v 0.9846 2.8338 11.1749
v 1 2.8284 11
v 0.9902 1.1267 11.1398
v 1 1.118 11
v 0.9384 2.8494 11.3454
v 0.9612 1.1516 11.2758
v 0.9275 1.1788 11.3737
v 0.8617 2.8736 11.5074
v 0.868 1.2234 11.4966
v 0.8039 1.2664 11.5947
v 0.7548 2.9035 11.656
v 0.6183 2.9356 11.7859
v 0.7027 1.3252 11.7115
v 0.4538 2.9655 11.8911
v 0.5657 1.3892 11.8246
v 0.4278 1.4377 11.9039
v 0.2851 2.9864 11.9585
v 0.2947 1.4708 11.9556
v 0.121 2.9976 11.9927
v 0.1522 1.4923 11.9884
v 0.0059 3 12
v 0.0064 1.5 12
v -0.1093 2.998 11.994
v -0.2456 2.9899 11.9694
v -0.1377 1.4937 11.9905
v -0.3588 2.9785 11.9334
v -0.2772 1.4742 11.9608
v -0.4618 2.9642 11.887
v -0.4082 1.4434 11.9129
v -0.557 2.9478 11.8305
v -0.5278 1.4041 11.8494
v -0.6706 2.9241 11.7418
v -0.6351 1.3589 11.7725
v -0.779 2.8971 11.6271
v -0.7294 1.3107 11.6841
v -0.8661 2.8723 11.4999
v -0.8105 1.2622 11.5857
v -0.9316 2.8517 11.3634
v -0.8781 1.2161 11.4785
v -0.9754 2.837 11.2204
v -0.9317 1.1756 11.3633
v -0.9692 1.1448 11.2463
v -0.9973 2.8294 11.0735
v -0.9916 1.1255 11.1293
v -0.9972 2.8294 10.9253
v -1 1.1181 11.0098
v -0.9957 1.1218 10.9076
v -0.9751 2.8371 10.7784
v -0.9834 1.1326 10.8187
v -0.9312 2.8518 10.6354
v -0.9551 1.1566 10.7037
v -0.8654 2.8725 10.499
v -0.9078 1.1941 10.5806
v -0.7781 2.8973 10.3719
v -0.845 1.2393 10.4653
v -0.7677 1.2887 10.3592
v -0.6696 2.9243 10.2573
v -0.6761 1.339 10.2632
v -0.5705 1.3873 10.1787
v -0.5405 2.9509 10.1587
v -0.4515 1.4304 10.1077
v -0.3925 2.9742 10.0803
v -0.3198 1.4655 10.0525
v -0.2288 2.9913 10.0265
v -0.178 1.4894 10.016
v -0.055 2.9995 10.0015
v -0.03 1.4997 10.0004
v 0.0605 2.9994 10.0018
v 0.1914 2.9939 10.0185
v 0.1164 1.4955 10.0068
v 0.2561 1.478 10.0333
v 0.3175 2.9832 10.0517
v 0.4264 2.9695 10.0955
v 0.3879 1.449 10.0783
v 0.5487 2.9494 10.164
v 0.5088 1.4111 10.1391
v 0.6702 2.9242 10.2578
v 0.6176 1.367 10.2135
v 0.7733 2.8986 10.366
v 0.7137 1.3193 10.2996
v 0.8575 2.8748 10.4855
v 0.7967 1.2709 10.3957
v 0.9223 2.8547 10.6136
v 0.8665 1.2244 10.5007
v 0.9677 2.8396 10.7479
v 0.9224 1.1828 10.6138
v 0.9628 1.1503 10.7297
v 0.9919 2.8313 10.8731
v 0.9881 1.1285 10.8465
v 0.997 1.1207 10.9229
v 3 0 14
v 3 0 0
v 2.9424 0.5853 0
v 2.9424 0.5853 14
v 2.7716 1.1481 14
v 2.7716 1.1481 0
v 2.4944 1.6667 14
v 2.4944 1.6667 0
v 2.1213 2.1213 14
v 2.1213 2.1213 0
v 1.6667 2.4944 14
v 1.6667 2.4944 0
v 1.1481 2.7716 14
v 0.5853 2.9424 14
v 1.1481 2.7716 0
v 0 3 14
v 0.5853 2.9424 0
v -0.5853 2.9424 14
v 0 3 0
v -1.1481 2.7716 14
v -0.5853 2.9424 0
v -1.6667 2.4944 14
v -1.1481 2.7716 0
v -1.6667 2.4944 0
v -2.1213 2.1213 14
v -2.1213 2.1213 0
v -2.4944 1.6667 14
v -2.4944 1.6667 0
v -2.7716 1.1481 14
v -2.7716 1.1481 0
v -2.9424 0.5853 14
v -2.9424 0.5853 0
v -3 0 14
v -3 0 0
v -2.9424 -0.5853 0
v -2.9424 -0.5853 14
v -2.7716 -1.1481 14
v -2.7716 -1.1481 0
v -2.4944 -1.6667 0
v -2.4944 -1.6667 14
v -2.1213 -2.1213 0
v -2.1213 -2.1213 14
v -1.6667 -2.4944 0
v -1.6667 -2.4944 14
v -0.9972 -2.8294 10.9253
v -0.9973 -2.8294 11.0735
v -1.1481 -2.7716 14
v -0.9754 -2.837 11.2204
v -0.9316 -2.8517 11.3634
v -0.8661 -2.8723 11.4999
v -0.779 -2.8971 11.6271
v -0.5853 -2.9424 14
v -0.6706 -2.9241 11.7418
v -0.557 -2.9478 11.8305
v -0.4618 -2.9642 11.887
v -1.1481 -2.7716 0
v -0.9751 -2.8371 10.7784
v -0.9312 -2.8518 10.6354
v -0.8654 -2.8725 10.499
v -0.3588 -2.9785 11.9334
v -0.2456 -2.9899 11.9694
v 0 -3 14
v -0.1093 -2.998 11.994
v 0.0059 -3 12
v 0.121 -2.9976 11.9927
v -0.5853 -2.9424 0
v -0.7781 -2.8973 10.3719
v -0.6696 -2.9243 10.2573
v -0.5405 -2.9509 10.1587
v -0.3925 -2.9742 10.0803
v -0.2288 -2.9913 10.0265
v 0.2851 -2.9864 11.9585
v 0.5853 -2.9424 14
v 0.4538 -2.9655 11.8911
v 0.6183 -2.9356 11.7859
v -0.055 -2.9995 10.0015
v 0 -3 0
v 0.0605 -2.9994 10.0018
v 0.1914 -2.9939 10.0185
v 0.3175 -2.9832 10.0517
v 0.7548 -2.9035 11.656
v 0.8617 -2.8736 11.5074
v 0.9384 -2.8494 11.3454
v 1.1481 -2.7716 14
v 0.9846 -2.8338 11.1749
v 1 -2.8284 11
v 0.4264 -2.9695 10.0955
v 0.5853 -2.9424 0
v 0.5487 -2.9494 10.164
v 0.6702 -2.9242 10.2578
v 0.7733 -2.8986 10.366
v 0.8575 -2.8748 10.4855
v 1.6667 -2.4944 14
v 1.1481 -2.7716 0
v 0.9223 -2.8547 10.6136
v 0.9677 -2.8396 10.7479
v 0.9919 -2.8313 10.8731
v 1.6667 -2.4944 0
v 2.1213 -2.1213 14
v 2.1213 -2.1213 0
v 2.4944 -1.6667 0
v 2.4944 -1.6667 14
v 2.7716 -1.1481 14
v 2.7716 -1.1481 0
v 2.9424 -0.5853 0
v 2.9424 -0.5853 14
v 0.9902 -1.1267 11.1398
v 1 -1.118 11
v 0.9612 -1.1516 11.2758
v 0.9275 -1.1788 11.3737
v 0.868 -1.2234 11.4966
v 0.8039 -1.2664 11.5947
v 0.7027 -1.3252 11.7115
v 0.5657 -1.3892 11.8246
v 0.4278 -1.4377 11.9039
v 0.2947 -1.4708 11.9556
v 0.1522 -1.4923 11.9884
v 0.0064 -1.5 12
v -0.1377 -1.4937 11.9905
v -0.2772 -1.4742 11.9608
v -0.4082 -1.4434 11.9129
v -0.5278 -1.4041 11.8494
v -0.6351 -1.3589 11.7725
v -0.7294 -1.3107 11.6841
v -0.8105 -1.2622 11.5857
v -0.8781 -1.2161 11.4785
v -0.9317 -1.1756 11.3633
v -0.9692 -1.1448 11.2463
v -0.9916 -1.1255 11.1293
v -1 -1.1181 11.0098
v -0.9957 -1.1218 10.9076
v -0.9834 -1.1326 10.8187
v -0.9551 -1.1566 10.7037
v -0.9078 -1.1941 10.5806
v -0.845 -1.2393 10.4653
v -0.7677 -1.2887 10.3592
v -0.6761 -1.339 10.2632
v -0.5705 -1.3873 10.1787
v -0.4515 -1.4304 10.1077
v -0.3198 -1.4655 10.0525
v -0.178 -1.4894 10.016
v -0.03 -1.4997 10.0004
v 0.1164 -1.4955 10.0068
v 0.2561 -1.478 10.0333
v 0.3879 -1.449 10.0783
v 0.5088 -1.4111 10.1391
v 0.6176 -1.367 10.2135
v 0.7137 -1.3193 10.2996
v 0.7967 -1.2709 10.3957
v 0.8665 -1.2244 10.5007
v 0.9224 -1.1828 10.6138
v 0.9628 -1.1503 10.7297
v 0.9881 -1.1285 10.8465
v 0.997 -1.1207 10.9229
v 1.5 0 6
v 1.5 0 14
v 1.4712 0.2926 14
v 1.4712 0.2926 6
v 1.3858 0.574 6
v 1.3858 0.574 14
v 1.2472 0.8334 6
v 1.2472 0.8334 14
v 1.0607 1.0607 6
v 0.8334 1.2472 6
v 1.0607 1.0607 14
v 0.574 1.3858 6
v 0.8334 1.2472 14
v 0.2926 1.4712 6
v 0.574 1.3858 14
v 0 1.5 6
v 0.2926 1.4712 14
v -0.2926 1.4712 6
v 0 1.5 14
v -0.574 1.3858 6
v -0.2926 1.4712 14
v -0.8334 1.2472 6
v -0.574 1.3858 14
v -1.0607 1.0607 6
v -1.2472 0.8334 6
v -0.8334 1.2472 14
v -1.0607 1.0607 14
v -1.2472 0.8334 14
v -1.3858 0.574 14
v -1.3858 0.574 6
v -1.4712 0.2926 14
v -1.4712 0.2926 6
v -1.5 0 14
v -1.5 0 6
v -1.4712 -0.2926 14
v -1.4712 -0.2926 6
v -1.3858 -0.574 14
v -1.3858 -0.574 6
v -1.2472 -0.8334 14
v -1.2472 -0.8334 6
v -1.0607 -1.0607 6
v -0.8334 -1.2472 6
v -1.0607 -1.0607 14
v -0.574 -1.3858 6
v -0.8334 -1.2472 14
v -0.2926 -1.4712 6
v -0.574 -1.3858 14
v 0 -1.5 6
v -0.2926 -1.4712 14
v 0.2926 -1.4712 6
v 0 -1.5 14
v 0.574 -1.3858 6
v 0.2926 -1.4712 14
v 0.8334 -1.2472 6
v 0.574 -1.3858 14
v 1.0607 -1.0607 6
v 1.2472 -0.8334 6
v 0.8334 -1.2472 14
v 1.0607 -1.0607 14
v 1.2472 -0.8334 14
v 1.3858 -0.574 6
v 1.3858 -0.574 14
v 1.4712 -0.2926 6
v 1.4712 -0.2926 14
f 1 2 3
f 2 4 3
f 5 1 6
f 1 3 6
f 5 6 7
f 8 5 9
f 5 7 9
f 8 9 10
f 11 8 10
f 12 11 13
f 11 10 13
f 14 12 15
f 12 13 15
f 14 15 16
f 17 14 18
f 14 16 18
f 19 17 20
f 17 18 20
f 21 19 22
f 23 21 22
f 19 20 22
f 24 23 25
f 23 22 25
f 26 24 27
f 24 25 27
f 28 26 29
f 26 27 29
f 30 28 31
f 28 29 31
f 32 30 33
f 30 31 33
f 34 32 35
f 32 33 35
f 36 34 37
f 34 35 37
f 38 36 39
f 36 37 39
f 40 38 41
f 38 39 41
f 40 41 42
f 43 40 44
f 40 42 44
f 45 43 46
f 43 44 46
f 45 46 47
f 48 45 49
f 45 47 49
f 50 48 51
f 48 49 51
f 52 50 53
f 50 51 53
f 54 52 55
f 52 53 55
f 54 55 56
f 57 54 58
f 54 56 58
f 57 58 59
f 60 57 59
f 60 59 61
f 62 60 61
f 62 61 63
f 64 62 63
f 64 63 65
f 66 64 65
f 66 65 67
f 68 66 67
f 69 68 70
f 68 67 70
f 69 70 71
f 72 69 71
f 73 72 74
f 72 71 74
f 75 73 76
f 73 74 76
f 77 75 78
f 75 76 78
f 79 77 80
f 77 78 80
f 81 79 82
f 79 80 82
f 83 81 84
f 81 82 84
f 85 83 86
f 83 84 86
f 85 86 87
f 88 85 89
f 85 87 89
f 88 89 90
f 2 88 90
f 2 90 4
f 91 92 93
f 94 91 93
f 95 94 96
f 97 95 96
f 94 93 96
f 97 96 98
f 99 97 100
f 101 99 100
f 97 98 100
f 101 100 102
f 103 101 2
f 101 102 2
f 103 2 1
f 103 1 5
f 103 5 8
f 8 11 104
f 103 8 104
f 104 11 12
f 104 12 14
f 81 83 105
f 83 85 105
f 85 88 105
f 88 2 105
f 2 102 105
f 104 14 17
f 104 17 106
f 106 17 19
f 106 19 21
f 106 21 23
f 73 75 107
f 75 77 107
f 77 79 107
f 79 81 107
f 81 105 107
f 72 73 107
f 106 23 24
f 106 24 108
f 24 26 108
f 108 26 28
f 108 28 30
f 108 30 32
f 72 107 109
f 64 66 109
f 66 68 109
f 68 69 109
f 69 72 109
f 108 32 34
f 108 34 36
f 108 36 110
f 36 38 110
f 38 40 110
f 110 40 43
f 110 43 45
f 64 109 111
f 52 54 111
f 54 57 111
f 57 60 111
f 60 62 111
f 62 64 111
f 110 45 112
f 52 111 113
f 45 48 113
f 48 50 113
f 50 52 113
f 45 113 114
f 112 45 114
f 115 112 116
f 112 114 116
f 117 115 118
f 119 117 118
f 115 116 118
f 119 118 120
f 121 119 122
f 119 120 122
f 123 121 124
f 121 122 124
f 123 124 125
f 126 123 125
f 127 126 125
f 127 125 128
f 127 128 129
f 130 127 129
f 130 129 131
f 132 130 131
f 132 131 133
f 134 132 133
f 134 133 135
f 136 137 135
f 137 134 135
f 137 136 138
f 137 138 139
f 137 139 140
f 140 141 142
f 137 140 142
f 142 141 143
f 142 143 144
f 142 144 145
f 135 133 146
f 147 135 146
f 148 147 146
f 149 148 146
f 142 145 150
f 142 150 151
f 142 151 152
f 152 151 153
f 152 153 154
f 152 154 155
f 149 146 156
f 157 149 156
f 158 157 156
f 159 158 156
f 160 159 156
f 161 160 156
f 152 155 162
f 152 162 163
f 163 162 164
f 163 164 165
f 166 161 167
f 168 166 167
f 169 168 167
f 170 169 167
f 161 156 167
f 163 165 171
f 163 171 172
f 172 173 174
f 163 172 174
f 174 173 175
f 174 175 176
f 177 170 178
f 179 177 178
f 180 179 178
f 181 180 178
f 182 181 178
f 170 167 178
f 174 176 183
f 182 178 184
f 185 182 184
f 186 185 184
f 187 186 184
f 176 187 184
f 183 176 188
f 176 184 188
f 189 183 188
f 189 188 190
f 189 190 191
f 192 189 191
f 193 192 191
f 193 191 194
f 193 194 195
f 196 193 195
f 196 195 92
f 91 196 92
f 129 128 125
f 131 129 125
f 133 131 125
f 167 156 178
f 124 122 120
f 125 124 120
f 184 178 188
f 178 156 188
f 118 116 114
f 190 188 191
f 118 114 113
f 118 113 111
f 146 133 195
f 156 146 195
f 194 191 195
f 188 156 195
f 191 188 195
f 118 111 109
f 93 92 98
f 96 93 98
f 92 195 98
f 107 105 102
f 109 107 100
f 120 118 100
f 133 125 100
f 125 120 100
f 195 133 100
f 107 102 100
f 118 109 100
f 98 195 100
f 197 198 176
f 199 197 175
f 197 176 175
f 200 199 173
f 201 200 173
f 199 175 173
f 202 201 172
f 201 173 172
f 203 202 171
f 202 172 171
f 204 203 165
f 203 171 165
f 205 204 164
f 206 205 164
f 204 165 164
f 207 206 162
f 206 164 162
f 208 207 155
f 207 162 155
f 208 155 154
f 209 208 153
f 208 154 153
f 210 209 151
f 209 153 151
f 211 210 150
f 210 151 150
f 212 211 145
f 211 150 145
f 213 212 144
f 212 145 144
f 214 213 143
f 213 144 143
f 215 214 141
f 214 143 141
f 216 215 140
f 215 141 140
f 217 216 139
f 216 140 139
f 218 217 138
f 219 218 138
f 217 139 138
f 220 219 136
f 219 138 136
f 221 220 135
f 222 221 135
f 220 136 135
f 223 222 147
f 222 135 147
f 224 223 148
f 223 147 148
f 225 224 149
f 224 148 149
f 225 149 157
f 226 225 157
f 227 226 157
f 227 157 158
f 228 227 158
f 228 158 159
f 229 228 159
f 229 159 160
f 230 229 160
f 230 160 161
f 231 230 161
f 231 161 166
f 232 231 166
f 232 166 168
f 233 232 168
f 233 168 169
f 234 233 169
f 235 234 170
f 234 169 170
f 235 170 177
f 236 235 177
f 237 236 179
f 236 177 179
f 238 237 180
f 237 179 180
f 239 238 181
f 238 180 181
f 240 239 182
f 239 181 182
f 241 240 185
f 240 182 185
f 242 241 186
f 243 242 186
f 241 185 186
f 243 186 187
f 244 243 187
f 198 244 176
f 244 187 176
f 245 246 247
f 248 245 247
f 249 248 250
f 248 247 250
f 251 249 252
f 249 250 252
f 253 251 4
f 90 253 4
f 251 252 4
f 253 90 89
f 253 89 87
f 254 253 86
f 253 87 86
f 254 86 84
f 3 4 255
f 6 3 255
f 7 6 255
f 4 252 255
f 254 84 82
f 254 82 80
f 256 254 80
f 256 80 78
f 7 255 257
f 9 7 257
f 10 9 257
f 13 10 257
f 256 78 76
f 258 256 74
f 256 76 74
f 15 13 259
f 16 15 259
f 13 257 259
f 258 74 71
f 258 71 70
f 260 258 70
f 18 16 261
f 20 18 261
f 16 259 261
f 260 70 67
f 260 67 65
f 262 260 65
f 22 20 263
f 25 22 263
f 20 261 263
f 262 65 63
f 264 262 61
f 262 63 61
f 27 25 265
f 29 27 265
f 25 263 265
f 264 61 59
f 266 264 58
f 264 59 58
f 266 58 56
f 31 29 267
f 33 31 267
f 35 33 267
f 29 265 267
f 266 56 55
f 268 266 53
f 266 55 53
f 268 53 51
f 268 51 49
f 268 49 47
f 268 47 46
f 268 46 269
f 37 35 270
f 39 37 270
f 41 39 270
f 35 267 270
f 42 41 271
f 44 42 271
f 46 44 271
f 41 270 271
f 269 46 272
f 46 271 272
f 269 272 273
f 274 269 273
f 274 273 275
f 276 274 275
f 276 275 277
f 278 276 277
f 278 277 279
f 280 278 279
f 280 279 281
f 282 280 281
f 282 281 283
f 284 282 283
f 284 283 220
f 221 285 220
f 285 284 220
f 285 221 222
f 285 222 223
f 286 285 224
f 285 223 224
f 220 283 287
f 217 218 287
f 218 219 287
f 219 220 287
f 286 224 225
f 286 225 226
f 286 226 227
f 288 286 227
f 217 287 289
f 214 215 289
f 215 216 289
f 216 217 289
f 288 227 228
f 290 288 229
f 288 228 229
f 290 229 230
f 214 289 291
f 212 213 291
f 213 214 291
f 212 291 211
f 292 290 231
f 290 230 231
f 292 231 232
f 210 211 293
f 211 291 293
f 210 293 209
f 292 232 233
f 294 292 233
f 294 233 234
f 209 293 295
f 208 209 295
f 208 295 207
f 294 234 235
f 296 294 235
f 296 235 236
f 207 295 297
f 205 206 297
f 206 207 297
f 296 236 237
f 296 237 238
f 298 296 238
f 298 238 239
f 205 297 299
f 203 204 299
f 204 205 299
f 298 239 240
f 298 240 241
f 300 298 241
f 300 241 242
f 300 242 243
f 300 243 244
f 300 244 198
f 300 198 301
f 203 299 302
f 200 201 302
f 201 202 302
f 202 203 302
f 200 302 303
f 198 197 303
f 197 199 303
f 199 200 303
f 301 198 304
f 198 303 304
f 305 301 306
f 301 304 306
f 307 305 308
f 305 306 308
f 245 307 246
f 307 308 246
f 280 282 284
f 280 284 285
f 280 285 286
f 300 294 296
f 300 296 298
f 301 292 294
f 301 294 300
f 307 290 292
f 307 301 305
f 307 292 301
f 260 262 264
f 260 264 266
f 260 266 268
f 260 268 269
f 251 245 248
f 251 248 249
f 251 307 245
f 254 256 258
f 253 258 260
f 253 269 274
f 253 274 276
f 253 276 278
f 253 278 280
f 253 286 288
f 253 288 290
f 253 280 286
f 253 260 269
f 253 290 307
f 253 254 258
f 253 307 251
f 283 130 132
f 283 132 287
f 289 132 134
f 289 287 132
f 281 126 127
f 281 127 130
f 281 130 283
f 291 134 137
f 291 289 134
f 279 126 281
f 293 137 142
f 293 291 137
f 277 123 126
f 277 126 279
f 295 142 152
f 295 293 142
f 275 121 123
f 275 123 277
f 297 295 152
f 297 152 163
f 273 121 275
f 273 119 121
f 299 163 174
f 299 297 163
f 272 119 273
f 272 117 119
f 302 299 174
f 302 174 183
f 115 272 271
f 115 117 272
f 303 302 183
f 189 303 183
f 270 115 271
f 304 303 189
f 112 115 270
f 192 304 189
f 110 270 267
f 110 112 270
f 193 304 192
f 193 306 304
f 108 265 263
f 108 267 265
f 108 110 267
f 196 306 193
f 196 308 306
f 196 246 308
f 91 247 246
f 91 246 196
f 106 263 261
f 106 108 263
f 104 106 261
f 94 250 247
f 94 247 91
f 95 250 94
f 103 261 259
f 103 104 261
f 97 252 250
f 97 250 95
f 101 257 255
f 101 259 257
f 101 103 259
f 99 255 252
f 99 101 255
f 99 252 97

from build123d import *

# Parameters (mm, degrees)
SKETCH002_R  = 1
PAD001_DEPTH = 5
SKETCH_R     = 3
PAD_DEPTH    = 14
SKETCH001_R  = 1.5
POCKET_DEPTH = 8


with BuildPart() as pad001:
    # Sketch002 → Pad001 (new body, symmetric)
    with BuildSketch(Plane.XZ):
        with Locations((0, 11)):
            Circle(SKETCH002_R)
    extrude(amount=PAD001_DEPTH, both=True)


with BuildPart() as cut:
    # Sketch → Pad (new body)
    with BuildSketch(Plane.XY):
        Circle(SKETCH_R)
    extrude(amount=PAD_DEPTH)

    # Sketch001 → Pocket (cut)
    with BuildSketch(Plane.XY.offset(14)):
        Circle(SKETCH001_R)
    extrude(amount=-POCKET_DEPTH, mode=Mode.SUBTRACT)

    # Cut: cut Pad001
    add(pad001.part, mode=Mode.SUBTRACT)


solid = cut.part
